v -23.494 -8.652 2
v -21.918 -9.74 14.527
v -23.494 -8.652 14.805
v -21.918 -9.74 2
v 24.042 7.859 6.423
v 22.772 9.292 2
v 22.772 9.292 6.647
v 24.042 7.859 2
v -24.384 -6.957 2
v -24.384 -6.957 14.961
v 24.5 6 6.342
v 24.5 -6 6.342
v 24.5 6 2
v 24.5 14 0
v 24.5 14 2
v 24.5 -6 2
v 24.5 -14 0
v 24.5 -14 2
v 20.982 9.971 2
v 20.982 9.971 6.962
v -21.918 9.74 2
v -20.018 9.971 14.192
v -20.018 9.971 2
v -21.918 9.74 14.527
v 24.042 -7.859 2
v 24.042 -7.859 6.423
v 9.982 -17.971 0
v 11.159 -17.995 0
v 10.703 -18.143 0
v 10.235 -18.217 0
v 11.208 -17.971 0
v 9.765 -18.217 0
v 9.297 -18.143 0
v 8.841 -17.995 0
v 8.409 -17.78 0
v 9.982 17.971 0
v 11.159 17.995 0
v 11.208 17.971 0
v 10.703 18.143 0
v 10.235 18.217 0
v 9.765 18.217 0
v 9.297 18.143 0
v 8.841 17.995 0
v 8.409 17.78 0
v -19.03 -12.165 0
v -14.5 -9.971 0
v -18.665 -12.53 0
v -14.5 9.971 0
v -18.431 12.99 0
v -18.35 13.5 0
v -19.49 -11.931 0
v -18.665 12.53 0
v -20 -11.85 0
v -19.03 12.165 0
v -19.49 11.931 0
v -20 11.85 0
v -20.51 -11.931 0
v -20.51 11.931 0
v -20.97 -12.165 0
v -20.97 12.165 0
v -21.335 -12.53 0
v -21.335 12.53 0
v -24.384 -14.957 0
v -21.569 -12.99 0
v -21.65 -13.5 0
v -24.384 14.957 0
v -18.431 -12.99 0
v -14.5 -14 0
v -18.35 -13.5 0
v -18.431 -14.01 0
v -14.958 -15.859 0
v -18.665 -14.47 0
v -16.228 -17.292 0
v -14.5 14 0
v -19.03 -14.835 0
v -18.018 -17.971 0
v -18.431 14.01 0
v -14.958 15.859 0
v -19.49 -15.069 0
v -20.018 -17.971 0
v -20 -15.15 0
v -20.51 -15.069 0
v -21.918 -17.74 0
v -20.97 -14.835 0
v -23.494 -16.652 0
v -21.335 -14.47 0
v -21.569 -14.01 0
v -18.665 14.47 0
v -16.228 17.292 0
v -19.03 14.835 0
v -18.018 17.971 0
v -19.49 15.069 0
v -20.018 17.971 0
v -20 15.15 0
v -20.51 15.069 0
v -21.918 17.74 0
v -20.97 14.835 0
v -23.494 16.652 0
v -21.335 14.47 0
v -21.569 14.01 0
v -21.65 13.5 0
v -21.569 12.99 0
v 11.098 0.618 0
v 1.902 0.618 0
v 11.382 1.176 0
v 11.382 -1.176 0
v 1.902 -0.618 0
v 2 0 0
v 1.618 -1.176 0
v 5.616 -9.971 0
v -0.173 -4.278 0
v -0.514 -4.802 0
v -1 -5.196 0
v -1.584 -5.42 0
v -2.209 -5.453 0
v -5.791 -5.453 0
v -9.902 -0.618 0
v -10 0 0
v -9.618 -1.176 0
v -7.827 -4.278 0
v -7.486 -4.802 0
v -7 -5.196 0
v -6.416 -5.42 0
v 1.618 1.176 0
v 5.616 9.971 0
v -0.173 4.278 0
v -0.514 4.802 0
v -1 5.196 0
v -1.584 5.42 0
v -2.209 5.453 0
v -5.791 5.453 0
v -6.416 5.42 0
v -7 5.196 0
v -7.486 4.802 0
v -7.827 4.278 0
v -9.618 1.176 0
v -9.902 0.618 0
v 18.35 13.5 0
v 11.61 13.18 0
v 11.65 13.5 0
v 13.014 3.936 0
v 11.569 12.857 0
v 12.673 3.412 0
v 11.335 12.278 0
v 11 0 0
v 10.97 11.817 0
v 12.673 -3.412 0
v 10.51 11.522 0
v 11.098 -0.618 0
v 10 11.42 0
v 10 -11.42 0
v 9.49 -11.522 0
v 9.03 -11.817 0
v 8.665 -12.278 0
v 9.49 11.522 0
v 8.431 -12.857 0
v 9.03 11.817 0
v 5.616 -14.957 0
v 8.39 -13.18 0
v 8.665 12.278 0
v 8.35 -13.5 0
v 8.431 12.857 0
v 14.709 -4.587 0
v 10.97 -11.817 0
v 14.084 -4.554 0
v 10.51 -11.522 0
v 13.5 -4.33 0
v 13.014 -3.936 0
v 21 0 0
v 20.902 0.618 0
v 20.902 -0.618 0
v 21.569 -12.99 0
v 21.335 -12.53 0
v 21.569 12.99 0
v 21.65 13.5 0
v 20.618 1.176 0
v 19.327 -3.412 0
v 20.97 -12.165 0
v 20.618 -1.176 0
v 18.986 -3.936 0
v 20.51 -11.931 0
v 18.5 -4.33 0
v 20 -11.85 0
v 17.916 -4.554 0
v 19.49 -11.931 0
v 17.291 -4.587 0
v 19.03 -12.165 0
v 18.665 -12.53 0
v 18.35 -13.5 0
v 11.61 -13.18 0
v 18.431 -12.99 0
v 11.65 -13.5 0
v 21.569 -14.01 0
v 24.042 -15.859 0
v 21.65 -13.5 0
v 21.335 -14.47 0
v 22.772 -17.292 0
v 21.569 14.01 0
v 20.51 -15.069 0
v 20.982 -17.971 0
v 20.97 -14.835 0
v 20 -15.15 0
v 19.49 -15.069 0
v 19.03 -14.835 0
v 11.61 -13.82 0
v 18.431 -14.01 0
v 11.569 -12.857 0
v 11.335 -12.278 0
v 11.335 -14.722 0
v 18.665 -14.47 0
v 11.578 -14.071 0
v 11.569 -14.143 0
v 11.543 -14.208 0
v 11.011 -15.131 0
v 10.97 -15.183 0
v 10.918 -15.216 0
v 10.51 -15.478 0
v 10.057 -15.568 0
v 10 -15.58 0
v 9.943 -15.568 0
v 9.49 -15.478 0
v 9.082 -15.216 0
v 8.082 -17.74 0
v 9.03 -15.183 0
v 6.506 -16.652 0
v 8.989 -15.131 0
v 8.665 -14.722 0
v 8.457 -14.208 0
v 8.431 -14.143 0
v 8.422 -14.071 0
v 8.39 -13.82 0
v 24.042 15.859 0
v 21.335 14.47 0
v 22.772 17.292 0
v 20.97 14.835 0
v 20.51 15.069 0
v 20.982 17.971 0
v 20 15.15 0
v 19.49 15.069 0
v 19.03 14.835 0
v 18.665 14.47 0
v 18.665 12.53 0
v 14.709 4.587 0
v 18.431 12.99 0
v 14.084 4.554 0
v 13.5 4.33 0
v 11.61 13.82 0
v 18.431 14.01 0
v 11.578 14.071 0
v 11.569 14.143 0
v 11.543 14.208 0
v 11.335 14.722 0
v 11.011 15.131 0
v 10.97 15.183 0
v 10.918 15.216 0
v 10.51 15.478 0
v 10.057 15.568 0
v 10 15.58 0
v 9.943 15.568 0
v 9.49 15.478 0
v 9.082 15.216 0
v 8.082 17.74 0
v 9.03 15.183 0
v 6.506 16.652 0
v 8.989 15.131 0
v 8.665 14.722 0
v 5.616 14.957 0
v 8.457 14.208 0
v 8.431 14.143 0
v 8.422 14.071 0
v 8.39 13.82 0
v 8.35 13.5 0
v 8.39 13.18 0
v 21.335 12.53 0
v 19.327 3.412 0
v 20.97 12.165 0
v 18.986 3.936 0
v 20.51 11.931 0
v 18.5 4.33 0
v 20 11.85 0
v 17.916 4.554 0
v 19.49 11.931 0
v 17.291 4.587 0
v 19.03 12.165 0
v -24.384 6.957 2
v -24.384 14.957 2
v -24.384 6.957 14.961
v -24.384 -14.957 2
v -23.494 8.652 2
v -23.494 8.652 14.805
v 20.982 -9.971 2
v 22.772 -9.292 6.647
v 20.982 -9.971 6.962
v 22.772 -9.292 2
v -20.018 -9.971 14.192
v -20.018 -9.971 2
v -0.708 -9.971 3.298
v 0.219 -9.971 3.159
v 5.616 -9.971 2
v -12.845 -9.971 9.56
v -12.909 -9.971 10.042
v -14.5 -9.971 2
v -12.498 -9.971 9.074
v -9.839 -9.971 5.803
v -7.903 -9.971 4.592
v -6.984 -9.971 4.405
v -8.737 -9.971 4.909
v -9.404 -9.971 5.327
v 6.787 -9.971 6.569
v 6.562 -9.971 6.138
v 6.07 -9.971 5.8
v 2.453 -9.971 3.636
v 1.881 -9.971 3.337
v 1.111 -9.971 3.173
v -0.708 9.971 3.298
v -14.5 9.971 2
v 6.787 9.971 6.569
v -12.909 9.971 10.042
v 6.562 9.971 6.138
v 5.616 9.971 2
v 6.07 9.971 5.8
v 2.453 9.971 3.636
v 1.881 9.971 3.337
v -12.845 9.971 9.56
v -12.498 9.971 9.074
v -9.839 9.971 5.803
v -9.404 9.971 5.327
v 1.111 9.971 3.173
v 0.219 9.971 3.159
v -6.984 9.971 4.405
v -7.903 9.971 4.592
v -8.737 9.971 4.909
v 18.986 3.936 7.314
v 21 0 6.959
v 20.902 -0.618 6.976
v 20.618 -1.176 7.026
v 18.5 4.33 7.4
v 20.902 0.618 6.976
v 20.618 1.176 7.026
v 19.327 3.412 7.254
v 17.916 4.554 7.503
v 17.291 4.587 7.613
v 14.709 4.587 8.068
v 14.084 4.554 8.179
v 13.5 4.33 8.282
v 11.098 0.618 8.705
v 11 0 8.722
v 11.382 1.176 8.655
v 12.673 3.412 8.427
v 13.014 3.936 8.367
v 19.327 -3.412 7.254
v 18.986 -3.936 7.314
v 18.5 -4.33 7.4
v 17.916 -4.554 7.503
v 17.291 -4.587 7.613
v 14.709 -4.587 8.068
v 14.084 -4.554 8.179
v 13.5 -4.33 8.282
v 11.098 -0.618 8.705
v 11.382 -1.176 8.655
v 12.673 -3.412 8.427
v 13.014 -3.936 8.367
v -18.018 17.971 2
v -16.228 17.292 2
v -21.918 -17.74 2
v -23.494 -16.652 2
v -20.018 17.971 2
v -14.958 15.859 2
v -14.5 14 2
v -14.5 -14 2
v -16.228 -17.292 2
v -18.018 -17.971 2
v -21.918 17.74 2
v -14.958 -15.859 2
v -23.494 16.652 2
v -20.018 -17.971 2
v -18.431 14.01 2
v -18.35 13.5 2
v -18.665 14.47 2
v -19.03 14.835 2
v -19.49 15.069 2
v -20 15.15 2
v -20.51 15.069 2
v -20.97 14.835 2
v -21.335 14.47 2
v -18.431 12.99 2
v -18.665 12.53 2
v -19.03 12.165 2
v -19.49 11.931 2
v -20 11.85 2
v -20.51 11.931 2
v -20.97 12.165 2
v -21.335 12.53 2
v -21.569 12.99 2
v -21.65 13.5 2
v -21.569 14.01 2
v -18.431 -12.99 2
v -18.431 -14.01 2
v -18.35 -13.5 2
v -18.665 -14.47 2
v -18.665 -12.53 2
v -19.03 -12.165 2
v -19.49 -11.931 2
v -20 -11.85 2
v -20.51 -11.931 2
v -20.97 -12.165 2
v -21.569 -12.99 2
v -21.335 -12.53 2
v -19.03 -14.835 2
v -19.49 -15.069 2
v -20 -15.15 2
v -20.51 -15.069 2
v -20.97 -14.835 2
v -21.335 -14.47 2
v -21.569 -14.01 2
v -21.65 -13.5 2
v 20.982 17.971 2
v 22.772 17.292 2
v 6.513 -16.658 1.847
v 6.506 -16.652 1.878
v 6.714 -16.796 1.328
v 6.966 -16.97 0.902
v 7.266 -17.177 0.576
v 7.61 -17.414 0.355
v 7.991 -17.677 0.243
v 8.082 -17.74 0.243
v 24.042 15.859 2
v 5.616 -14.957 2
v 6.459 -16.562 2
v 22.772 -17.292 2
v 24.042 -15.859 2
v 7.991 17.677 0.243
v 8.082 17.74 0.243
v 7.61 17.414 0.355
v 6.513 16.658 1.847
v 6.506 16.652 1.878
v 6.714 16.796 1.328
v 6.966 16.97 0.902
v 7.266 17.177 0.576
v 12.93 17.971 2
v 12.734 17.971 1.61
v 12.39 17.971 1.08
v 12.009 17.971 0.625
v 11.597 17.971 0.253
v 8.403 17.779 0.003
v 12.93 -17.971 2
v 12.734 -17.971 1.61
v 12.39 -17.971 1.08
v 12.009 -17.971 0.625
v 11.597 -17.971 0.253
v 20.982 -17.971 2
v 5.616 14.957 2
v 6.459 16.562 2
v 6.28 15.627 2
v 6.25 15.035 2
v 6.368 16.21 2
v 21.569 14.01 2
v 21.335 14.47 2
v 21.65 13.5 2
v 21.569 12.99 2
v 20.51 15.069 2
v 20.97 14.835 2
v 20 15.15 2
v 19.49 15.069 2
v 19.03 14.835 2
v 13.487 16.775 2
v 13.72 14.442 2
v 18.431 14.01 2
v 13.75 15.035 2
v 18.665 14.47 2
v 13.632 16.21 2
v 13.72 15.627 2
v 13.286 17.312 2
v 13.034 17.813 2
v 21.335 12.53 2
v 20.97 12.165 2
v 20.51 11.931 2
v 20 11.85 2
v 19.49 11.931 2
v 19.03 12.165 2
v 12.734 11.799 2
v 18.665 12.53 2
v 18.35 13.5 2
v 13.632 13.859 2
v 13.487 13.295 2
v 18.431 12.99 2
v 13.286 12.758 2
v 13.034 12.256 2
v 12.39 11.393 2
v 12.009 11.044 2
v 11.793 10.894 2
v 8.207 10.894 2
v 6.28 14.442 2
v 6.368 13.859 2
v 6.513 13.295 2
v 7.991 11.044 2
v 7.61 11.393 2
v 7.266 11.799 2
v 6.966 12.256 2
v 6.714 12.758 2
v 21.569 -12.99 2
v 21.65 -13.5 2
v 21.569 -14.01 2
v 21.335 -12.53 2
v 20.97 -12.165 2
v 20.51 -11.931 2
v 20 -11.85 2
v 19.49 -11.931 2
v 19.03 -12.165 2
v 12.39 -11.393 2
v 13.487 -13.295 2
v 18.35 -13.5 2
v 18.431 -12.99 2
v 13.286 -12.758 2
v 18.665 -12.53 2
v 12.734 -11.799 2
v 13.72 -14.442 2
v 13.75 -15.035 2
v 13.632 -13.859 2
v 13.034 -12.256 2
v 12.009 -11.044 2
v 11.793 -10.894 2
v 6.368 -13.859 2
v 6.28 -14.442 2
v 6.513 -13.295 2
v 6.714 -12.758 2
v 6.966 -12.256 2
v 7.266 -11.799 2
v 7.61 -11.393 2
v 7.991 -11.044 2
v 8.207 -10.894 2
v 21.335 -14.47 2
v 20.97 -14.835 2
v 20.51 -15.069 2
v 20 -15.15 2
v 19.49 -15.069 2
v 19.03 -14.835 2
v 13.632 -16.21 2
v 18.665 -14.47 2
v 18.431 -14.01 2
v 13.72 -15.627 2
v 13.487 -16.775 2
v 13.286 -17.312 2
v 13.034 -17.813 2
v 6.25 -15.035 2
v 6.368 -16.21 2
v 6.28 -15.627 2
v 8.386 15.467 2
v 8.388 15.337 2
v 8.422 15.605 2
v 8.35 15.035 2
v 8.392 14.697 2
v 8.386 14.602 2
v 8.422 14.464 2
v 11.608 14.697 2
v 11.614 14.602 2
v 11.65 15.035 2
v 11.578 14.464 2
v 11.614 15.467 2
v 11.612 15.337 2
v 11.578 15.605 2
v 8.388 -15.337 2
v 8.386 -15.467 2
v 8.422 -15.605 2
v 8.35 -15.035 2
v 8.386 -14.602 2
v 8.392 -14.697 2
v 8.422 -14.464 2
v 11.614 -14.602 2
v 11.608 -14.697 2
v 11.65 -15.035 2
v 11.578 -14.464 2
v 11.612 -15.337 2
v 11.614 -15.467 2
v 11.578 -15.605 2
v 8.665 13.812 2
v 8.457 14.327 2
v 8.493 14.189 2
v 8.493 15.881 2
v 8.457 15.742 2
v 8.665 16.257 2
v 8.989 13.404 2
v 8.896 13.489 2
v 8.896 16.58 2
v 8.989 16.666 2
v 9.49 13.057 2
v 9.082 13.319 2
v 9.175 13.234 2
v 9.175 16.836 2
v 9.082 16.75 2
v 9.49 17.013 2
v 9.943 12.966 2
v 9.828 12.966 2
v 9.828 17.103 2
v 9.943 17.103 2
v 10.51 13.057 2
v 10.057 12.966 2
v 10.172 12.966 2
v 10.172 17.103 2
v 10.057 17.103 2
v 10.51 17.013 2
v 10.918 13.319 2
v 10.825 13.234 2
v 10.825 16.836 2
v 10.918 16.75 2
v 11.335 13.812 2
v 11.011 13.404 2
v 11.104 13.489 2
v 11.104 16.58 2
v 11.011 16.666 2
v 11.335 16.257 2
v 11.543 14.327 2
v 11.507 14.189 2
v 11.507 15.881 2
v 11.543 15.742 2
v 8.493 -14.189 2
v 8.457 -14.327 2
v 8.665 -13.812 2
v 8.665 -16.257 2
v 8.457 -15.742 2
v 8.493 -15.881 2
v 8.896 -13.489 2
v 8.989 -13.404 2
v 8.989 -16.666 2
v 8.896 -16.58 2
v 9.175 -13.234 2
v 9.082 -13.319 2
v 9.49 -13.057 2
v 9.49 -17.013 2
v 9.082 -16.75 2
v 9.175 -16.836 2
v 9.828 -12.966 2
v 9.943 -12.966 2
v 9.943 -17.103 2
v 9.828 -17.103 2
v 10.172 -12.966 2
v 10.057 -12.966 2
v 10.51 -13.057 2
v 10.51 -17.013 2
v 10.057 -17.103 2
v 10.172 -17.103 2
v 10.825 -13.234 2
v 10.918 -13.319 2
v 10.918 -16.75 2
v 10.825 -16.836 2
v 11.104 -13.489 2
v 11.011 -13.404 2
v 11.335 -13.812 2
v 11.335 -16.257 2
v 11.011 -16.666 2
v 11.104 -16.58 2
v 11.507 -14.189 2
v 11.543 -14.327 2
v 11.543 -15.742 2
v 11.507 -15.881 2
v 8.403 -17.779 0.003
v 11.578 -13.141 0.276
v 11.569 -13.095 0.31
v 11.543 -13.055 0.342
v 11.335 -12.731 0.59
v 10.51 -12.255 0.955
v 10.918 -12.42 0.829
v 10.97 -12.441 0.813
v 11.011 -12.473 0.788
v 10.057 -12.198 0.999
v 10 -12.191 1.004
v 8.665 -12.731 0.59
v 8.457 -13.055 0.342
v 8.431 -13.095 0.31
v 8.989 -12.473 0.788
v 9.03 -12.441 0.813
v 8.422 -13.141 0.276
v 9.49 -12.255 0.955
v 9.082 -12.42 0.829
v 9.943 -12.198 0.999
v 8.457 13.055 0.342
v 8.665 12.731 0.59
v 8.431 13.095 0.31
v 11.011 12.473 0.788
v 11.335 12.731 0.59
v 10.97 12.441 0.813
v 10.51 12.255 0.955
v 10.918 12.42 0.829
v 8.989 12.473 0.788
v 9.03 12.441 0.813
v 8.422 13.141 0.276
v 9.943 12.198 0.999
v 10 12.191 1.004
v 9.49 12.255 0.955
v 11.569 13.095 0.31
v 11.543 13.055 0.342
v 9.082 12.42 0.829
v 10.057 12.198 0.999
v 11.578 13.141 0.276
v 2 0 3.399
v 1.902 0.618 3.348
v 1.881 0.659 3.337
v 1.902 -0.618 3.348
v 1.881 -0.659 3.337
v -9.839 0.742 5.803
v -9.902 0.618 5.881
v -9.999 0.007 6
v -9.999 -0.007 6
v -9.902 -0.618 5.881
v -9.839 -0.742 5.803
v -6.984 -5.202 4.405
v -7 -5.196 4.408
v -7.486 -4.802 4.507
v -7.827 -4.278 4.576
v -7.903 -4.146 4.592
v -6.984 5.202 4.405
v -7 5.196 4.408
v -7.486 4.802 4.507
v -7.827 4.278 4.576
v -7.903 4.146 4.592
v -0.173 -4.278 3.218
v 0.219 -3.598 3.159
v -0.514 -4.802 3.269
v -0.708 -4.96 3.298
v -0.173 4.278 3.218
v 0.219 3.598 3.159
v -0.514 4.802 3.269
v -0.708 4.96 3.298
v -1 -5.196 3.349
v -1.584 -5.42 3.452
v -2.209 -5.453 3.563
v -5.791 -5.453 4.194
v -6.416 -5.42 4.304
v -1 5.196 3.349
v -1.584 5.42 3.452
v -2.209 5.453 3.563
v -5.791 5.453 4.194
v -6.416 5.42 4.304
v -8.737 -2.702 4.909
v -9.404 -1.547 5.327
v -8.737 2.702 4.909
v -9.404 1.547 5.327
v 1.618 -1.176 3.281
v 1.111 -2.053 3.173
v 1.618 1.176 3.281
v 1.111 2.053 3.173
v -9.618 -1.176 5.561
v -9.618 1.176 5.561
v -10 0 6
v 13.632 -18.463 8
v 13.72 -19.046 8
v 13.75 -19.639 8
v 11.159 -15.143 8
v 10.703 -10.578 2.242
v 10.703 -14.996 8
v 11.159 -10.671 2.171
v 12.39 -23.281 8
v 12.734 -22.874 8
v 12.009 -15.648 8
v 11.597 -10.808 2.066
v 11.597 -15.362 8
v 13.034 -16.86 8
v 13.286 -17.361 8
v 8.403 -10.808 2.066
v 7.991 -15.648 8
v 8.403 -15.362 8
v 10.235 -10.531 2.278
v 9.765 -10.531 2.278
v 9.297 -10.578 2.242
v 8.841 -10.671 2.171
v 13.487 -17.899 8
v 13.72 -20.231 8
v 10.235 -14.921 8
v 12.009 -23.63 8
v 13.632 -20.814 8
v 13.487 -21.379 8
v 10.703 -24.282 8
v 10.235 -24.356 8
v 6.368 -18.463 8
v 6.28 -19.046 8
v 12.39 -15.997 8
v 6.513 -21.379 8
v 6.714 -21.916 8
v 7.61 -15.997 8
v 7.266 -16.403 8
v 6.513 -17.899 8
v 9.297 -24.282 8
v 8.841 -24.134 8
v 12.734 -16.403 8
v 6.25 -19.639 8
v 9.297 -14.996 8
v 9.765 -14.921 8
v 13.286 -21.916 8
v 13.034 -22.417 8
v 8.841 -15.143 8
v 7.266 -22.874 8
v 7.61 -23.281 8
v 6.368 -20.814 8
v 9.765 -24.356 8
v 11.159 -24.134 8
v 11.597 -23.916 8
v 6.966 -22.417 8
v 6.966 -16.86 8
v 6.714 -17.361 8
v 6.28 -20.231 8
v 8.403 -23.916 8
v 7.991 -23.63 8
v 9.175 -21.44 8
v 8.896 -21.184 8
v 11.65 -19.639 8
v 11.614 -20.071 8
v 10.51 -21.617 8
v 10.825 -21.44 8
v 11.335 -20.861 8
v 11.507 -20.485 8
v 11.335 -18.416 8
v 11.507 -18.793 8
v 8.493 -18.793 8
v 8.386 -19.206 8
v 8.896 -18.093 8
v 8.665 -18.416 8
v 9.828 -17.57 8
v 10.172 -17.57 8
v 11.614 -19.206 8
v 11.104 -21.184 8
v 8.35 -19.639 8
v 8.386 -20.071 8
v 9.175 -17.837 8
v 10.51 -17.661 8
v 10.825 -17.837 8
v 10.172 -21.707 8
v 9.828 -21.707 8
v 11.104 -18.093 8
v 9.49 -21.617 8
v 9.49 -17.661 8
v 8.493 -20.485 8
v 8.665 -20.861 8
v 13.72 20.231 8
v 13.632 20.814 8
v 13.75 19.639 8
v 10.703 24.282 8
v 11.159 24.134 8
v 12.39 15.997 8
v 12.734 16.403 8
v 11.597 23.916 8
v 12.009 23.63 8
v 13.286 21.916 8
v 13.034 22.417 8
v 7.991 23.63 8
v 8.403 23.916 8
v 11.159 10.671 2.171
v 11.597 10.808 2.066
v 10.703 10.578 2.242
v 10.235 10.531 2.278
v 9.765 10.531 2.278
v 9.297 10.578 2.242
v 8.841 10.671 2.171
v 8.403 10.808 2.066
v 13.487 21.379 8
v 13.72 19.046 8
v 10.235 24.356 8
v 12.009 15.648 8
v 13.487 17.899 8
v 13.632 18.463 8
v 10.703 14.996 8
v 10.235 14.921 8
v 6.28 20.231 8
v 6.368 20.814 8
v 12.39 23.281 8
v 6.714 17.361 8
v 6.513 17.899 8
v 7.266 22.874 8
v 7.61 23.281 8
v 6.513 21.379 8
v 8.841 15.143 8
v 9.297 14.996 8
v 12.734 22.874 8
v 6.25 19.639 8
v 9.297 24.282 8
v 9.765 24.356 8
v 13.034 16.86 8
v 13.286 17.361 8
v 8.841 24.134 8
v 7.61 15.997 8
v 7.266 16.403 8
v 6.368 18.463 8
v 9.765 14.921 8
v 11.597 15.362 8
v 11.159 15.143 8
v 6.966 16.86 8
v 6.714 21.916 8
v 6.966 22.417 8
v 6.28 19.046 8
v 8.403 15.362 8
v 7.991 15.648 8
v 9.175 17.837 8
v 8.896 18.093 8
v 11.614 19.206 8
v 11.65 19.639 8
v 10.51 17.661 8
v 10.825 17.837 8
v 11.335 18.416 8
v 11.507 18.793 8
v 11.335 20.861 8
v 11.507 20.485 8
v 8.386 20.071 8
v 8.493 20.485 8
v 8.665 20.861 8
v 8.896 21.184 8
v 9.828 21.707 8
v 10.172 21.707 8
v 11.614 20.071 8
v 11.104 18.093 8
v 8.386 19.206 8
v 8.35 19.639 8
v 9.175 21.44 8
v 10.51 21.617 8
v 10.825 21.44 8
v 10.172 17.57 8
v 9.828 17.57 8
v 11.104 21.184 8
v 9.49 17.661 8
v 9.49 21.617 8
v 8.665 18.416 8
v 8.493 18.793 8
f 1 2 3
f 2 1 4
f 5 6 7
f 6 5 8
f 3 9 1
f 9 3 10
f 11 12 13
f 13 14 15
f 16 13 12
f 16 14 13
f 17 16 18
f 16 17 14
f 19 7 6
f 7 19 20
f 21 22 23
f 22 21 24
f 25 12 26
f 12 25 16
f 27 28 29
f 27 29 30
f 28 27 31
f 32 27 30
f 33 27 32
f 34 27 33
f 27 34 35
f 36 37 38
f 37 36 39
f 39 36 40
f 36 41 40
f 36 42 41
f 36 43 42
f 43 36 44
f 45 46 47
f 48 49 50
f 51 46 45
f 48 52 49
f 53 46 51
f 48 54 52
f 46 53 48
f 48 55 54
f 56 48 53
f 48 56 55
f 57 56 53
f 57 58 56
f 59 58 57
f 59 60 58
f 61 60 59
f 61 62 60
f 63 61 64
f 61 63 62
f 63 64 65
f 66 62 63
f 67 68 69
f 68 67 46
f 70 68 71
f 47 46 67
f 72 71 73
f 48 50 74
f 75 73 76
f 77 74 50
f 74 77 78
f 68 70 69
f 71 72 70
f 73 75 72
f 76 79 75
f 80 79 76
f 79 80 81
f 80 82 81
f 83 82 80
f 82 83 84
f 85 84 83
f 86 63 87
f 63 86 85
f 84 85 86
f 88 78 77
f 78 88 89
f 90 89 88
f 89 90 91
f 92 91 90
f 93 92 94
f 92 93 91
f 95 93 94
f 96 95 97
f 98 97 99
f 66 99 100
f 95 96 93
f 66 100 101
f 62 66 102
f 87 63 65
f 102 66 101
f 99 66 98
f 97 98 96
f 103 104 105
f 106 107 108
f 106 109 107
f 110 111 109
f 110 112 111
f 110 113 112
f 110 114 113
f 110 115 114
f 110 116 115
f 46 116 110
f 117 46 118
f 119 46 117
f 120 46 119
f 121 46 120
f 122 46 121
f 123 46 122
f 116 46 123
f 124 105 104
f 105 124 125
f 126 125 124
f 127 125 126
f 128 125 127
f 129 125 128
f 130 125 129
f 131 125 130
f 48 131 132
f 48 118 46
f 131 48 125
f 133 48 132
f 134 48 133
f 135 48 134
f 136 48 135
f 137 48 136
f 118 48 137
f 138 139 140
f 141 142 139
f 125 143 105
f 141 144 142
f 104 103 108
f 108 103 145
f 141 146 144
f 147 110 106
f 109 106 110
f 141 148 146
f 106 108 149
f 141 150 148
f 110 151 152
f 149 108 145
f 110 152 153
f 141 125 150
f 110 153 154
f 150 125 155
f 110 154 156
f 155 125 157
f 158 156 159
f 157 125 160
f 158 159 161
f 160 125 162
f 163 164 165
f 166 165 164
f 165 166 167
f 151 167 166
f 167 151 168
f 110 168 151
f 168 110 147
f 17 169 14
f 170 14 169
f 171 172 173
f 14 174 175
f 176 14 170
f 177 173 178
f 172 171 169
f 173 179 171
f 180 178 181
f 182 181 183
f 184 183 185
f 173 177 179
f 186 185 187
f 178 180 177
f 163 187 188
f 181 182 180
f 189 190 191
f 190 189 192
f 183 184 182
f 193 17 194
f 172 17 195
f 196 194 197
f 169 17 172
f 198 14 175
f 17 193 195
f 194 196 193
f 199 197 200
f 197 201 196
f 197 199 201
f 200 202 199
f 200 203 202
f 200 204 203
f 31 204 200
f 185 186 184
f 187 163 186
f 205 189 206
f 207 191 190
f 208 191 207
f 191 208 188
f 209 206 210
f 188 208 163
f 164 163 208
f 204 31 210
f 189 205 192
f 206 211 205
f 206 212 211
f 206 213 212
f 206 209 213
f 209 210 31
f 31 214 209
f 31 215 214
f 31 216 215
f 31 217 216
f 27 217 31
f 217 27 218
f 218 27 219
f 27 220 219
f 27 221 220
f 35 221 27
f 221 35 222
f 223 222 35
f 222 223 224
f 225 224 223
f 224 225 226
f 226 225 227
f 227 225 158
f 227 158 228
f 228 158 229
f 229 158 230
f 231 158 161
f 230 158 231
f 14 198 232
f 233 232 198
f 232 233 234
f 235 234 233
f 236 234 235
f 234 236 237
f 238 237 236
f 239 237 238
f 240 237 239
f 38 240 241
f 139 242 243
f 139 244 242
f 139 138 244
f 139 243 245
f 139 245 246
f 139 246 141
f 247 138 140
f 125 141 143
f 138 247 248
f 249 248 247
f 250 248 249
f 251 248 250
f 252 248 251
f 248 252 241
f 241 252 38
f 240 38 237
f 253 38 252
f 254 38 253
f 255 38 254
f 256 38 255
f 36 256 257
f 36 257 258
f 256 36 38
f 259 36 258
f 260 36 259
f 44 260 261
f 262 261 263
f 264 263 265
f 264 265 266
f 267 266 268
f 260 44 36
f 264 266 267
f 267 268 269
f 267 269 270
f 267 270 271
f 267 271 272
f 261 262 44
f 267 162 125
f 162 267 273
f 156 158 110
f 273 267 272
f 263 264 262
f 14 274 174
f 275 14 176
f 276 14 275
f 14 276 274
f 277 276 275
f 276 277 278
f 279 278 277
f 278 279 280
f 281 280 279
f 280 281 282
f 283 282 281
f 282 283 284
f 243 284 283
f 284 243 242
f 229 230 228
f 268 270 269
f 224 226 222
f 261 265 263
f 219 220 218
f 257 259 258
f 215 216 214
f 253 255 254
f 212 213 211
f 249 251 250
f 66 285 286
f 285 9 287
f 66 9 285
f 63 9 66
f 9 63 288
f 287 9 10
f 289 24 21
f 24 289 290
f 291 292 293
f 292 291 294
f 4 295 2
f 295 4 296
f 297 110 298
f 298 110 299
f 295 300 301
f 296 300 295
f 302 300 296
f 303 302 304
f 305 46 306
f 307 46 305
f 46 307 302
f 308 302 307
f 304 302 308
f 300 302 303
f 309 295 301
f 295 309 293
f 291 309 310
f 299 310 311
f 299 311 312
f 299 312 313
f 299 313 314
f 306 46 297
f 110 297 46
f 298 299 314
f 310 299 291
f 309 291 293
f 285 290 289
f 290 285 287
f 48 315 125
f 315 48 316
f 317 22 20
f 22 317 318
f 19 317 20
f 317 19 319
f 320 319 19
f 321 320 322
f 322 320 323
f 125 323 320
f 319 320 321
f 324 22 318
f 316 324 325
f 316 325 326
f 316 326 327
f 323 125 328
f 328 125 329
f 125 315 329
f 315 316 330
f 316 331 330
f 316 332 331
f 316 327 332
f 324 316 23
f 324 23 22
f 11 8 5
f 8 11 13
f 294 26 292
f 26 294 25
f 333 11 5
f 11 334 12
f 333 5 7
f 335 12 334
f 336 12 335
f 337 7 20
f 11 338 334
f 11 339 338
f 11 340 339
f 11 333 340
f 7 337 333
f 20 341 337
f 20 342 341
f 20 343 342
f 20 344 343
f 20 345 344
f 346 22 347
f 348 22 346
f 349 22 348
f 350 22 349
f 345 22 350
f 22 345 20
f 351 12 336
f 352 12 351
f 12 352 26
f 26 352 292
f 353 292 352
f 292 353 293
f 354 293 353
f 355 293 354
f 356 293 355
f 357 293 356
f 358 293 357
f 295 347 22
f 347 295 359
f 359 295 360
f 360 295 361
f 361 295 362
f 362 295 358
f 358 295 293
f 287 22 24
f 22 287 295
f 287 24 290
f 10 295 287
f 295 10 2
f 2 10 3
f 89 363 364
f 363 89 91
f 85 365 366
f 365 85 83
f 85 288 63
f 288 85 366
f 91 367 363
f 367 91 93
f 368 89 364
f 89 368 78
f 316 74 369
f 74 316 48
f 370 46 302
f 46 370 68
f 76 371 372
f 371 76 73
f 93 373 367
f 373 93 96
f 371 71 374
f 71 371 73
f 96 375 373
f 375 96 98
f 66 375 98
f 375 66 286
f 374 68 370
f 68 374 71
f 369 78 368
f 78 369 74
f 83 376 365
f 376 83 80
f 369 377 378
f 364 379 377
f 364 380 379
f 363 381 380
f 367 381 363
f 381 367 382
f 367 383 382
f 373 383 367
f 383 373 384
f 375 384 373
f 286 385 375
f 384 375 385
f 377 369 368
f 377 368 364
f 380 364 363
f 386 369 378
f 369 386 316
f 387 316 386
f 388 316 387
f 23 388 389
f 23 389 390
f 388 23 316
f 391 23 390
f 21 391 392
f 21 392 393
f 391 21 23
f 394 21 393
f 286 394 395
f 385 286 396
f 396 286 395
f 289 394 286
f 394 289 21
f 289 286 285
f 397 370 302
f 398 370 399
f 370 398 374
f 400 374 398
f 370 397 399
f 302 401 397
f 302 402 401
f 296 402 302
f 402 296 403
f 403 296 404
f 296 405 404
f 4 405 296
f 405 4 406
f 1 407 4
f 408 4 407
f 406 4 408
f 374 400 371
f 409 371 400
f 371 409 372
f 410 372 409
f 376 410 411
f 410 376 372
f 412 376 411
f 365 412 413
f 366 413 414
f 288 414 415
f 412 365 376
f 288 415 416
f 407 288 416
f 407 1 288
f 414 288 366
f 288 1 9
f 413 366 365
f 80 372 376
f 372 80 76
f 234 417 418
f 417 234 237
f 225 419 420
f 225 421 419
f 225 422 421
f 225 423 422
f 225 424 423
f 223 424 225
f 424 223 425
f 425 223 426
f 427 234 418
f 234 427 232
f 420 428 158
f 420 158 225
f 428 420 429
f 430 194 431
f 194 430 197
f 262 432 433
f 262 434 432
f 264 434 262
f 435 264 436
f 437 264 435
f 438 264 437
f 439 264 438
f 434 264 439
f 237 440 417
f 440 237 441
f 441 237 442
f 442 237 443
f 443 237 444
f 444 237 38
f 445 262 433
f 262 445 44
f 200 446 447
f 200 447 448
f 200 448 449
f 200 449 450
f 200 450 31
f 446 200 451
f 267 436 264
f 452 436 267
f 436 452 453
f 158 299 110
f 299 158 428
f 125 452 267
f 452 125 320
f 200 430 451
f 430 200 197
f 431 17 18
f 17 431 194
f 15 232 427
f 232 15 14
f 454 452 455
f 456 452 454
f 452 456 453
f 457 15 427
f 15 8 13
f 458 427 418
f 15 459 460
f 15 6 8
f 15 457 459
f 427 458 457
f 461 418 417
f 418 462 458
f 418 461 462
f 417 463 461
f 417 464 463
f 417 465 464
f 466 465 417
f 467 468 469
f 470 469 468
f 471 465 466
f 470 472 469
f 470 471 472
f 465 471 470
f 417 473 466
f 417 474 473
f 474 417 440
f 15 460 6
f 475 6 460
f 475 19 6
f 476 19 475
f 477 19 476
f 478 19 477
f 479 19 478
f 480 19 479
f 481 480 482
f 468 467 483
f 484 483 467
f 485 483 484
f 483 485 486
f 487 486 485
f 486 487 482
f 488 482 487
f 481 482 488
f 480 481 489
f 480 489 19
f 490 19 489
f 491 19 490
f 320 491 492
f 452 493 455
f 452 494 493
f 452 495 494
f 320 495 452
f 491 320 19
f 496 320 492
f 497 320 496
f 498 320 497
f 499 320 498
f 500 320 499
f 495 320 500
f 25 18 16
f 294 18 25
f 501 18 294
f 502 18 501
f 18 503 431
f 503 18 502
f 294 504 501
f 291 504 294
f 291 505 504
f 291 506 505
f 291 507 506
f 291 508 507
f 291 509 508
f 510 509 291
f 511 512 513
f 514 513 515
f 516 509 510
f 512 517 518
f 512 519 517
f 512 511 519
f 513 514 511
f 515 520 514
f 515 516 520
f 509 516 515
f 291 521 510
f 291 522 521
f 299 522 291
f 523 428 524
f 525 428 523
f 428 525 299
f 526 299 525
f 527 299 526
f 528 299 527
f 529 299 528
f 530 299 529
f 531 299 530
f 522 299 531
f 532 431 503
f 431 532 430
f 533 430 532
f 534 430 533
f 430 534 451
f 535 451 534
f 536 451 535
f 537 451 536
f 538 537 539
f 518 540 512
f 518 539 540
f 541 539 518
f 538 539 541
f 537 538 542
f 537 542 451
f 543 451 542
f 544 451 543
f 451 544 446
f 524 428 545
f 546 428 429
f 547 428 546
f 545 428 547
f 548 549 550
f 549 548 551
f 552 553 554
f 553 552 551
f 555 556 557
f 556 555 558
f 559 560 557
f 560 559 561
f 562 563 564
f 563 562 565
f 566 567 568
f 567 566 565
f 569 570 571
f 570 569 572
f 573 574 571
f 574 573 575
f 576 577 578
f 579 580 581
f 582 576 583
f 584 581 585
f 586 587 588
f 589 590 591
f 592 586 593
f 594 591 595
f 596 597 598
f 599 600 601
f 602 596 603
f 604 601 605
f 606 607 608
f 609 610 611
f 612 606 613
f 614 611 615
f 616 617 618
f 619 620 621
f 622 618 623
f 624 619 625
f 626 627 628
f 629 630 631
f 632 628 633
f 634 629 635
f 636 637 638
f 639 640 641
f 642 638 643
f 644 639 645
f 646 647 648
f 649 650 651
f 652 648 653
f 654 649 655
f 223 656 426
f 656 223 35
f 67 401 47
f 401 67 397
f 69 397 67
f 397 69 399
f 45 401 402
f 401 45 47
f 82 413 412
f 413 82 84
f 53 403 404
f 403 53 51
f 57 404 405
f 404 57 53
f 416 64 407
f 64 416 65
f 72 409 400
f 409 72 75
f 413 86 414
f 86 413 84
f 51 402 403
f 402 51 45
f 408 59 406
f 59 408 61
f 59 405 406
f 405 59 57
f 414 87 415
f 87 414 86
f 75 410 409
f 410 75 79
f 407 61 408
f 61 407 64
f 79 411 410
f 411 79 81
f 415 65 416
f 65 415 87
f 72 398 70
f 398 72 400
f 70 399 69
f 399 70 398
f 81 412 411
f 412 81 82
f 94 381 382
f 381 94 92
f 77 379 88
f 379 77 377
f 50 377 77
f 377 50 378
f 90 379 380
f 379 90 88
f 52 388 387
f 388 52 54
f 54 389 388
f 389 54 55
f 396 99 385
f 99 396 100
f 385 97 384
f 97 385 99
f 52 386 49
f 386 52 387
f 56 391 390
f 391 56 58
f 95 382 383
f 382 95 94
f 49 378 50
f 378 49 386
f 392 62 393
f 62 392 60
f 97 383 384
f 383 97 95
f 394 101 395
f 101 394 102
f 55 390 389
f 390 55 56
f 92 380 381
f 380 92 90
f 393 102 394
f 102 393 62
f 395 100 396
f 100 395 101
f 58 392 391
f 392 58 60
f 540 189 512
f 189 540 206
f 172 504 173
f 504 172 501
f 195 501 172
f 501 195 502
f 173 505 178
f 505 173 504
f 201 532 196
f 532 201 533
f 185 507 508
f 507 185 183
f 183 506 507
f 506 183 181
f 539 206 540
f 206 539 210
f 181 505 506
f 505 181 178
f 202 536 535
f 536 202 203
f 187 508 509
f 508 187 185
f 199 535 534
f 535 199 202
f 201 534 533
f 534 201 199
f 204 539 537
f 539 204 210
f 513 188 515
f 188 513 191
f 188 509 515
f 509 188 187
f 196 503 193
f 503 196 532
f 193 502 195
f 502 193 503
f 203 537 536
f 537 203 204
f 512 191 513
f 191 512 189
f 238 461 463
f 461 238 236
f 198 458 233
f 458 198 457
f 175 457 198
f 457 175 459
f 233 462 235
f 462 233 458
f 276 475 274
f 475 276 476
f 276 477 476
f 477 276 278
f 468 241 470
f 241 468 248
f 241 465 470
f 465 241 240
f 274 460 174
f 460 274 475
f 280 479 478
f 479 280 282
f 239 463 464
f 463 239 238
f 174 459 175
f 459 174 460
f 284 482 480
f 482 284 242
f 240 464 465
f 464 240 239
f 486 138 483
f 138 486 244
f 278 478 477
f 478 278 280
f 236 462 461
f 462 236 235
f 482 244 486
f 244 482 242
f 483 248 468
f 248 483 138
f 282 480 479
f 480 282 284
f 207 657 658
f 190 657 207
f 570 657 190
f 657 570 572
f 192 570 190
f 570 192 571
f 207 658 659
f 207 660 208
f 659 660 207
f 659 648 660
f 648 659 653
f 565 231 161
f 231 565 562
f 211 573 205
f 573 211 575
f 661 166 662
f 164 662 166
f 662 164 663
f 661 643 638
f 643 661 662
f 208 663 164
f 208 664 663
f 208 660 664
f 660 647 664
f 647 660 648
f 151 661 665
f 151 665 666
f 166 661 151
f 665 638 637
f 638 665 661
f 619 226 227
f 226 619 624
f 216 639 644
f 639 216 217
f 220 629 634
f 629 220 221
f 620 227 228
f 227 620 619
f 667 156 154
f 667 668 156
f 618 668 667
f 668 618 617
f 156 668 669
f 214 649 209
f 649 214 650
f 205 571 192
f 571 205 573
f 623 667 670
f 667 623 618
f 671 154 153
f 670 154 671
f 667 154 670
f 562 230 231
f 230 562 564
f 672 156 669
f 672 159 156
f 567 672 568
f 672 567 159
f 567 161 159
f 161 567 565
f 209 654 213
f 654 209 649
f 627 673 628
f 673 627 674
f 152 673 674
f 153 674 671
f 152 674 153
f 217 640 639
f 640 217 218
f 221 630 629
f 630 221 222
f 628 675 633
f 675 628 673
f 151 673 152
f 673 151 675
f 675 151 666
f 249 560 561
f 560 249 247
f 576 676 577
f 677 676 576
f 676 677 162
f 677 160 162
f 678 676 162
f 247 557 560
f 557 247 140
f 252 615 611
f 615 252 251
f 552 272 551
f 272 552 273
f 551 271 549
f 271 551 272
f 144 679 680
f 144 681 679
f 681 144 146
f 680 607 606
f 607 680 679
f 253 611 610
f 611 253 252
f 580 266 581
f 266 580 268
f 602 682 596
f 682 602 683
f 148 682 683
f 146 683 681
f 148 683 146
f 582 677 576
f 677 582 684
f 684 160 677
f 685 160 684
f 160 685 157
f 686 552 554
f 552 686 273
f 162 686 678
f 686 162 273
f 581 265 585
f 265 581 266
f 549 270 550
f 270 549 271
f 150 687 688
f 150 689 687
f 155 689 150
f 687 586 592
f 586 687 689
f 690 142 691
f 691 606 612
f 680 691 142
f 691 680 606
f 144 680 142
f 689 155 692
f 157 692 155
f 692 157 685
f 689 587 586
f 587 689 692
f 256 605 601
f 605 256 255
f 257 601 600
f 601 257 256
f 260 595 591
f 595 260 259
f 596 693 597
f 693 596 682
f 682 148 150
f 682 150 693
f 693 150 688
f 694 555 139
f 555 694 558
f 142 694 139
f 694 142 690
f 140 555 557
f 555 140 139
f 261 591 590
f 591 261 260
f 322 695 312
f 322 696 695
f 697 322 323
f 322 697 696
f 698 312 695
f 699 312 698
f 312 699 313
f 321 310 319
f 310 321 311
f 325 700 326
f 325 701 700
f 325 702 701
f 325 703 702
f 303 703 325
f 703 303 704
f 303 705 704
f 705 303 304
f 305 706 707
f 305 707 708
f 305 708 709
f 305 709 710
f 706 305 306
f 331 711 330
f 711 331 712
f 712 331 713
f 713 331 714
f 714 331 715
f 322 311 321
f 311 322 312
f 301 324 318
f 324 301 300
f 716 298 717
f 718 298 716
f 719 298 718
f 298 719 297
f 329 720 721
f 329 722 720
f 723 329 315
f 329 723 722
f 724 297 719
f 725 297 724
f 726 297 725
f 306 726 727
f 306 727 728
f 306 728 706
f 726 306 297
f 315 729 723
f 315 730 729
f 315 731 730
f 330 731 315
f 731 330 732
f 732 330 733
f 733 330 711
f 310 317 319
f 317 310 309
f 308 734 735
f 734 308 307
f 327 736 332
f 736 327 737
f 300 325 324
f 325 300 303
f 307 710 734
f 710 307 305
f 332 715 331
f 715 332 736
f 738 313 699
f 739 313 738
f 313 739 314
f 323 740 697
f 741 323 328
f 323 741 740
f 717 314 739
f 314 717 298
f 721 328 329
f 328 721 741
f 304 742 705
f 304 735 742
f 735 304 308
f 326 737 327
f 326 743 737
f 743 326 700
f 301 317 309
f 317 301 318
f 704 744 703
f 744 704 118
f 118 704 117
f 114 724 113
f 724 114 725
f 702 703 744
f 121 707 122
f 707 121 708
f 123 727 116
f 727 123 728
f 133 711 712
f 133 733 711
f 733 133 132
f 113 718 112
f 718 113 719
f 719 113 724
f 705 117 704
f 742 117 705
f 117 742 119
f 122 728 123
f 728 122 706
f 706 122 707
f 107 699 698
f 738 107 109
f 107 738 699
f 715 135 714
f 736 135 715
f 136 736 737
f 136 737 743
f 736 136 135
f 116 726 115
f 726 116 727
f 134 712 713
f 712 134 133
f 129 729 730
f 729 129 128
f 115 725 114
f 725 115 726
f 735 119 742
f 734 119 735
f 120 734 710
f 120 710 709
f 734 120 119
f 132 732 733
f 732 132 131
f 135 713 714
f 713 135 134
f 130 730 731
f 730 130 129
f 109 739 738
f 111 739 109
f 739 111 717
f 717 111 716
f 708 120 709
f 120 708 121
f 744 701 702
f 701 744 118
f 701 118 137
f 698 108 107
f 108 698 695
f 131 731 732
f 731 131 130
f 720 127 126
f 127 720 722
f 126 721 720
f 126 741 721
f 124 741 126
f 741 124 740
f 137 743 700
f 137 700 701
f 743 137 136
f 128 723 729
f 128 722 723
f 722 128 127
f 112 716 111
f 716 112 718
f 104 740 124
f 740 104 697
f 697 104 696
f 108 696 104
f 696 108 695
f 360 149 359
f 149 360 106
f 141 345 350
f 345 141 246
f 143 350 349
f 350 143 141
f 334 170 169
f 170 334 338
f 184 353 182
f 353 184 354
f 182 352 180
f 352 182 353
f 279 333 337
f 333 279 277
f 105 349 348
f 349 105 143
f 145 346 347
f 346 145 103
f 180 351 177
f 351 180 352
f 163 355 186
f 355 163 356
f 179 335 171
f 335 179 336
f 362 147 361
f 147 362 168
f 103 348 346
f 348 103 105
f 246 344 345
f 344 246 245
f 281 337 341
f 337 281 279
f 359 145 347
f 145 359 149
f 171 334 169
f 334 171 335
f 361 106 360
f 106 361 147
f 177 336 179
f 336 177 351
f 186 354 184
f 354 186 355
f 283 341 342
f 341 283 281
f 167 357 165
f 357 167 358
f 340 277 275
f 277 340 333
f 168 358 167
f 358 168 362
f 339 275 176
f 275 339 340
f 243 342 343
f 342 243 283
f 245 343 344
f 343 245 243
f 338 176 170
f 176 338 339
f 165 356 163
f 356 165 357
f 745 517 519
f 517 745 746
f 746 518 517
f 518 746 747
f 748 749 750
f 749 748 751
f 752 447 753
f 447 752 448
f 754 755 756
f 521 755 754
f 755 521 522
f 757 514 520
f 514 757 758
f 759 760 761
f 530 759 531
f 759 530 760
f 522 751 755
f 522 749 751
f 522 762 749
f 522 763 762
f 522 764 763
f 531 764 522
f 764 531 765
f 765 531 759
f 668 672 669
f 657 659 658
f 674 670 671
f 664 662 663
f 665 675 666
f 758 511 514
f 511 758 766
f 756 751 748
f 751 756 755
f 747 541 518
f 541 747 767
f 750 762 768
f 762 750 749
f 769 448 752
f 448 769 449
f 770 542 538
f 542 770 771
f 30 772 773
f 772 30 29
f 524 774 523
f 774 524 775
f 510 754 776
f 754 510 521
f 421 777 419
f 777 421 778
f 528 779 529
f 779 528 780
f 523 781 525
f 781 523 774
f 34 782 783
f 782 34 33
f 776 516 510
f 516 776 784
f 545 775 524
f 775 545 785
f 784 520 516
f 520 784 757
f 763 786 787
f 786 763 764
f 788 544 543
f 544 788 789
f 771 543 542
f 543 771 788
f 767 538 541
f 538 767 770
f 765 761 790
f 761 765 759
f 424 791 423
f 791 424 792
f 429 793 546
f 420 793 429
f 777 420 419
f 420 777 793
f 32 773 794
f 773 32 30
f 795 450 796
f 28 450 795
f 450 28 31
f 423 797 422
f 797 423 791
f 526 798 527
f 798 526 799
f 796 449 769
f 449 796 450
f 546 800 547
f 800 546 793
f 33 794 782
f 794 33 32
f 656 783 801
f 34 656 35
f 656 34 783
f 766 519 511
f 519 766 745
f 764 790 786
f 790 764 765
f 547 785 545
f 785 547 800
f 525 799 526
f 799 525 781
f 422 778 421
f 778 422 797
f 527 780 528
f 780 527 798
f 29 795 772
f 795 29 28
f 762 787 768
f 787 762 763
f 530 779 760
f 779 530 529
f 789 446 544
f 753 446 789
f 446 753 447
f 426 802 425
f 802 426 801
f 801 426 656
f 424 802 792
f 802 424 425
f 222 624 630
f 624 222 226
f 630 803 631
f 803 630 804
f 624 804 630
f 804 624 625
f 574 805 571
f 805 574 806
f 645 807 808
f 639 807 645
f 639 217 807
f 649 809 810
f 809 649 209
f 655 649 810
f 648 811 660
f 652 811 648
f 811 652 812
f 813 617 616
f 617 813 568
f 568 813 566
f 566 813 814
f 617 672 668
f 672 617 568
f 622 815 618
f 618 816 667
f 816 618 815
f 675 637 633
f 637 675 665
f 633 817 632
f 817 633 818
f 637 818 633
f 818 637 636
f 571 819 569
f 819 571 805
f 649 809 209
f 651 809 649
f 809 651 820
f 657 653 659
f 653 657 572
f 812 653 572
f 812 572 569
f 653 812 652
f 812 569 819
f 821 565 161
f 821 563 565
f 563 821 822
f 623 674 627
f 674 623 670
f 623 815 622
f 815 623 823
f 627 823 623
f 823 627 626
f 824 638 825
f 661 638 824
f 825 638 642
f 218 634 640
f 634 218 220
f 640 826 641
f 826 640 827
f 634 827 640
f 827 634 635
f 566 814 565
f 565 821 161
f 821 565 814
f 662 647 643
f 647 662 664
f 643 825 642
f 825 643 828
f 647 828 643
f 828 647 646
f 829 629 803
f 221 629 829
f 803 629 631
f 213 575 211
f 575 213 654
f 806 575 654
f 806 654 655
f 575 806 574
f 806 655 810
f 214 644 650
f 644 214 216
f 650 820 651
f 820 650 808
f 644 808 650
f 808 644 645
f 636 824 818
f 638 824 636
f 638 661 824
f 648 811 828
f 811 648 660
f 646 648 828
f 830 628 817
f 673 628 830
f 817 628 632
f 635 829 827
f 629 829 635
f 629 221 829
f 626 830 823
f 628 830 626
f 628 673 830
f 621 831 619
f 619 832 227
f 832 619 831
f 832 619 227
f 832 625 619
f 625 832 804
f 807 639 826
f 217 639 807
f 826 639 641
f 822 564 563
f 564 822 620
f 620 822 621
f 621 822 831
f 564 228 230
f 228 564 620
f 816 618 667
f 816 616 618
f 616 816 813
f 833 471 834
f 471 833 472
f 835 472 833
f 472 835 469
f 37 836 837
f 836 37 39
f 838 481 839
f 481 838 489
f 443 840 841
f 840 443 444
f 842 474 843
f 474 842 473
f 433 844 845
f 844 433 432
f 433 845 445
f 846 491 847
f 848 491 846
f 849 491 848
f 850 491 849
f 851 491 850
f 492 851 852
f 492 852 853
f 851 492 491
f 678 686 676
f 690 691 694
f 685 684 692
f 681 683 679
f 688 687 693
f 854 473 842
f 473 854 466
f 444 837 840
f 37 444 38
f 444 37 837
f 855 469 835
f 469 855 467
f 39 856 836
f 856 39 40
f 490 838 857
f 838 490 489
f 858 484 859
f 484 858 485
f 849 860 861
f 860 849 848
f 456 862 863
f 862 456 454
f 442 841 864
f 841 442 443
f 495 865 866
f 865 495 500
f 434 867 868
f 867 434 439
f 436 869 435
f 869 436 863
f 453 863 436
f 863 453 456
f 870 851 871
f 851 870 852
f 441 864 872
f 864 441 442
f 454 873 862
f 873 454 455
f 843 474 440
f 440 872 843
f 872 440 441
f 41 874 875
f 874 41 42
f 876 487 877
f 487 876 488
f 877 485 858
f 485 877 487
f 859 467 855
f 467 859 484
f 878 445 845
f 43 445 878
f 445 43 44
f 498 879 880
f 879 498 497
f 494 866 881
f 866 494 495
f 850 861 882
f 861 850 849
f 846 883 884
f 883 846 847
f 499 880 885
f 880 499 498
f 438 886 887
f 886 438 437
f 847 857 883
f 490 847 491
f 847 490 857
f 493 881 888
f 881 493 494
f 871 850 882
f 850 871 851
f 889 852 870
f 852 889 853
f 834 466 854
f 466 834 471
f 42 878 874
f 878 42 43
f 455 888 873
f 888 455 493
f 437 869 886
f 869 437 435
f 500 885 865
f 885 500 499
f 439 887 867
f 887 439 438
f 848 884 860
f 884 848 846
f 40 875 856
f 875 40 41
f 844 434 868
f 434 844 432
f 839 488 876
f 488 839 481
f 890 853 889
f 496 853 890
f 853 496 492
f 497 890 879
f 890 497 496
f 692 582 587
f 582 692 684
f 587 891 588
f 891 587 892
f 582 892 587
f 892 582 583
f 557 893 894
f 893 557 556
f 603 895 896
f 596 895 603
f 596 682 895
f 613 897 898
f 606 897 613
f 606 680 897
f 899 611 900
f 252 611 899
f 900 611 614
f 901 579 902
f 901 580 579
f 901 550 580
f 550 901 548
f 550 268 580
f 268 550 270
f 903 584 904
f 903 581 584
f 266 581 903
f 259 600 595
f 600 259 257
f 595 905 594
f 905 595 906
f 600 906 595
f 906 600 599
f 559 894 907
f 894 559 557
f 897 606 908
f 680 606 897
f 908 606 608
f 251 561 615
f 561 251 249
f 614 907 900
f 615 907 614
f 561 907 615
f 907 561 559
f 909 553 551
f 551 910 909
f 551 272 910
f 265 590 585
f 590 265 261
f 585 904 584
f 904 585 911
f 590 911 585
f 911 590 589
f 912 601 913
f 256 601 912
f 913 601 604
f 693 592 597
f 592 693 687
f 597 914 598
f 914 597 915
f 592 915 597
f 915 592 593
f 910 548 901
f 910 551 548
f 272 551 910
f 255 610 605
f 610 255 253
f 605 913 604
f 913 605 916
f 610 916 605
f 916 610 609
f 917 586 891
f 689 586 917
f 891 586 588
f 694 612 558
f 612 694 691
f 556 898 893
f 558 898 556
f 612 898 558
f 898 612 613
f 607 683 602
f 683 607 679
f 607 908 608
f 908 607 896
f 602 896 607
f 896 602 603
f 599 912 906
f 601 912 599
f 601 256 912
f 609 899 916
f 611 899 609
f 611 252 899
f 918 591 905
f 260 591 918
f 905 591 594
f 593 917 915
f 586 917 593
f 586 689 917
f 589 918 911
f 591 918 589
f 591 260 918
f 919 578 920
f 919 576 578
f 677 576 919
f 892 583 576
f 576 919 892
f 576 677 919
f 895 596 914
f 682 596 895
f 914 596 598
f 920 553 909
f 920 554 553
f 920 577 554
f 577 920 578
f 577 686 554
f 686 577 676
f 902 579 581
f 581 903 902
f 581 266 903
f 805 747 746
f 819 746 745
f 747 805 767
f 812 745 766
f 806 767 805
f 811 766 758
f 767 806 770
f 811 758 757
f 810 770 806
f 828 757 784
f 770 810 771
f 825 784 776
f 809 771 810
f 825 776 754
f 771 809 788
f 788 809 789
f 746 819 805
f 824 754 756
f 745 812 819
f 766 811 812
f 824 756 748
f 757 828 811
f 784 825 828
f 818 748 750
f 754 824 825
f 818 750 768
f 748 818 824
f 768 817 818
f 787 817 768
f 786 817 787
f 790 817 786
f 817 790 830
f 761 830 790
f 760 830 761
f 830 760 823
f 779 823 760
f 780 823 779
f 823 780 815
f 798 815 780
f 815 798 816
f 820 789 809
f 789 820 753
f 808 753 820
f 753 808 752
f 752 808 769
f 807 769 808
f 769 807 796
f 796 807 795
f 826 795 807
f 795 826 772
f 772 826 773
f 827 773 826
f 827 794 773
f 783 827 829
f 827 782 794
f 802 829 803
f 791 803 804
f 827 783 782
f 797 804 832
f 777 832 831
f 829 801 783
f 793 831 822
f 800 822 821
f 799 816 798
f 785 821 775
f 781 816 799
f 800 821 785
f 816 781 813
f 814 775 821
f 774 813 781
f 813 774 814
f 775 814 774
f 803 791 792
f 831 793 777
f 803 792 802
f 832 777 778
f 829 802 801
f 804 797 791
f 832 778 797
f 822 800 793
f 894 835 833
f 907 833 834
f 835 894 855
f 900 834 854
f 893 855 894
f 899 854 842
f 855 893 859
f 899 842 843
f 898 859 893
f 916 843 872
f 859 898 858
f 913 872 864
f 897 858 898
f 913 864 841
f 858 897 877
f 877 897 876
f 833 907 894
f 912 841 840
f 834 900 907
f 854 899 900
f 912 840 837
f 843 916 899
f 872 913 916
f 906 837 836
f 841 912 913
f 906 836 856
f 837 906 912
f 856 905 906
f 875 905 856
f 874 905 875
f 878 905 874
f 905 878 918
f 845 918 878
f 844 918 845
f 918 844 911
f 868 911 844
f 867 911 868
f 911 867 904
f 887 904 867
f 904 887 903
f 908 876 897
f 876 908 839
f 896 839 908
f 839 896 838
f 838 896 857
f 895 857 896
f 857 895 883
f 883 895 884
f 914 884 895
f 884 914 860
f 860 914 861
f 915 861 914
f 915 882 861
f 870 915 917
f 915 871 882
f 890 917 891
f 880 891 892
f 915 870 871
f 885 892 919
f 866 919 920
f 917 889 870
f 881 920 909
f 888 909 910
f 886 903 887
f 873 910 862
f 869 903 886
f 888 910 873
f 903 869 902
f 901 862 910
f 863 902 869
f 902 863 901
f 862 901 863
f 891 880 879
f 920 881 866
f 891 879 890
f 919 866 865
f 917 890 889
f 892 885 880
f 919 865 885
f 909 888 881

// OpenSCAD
// file: honeycomb_lattice.scad
/**
 * Honeycomb lattice library
 *
 * @autor: vpoten
 */
 
/**
 *
 */
module hexagon(rad, cornerR, thick) {
hull(){
	for(i=[0:5]){
	rotate([0,0,60*i]) translate([rad,0,0]) cylinder(r=cornerR, h=thick, $fn=20);
	}
}
}//end module hexagon

/**
 * @param rows:  number of rowns, must be greater than 0
 * @param cols:  number of colummns, must be greater than 1
 */
module honeycombLattice(rows, cols, hexaR, cornerR, thick, innerDst, fillHalves=false) {

extHexR = sqrt(2*cornerR*cornerR) + hexaR + innerDst/2;
extHexSideL = sin(30)*extHexR*2;
extHexH = cos(30)*extHexR;
dist = 2*extHexR + extHexSideL;
hexH = sqrt(2*cornerR*cornerR) + hexaR;

numEvenCols = floor(cols/2)+(cols%2);
numOddCols = floor(cols/2);

translate([extHexR,extHexH,0]) {
for(i=[0:rows-1]){
	if((i%2)==1){
		for(j=[0:numOddCols-1]) translate([dist*j+(extHexR+extHexSideL/2),i*extHexH,0]) hexagon(hexaR, cornerR, thick);
	}
	else{
		for(j=[0:numEvenCols-1]) translate([dist*j,i*extHexH,0]) hexagon(hexaR, cornerR, thick);
	}
}

if( fillHalves==true ){

	for(i=[-1,rows]){ 
		for(j=[0:numOddCols-1]) translate([dist*j+(extHexR+extHexSideL/2),i*extHexH,0]){
			difference(){
			hexagon(hexaR, cornerR, thick);
			if(i==-1){ translate([0,-extHexR/2+innerDst/2,0]) cube(size=[extHexR*2,extHexR,thick*2.5],center=true); }
			else{ translate([0,extHexR/2-innerDst/2,0]) cube(size=[extHexR*2,extHexR,thick*2.5],center=true); }
			}
		}
	}
}

}//translate

}//end module honeycombLattice

//test
hexagon(20, 2, 29);
honeycombLattice(2, 4, 15, 3, 3, 11, fillHalves=false);
color("grey") translate([0,0,40]) honeycombLattice(5, 6, 11, 2, 3, 19, fillHalves=true);
color("blue") translate([0,0,60]) honeycombLattice(3, 5, 5, 2, bottomThick+1, 3, fillHalves=true);
// file: dronePlates.scad
/**
 * dronePlates.scad
 * Plate library
 *
 * GNU GPL V3
 * @author: Victor Potenciano
 */

m3Rad = 3.4/2;
cornerR = 4;

/**
 *
 */
module helperDisk(diameter) {
	cylinder(r = diameter/2, h = 0.6, $fn=20);
}

/**
 *
 */
module roundedRect(size, radius) {
	x = size[0];
	y = size[1];
	z = size[2];

	linear_extrude(height=z)
	hull() {
	// place 4 circles in the corners, with the given radius
	translate([(-x/2)+(radius/2), (-y/2)+(radius/2), 0]){ circle(r=radius); }
	translate([(x/2)-(radius/2), (-y/2)+(radius/2), 0]){ circle(r=radius); }
	translate([(-x/2)+(radius/2), (y/2)-(radius/2), 0]){ circle(r=radius); }
	translate([(x/2)-(radius/2), (y/2)-(radius/2), 0]){ circle(r=radius); }
	}
}

/**
 * rounded rectangle triangle with corner at origin
 */
module roundedTriangle(size, radius) {
	x = size[0];
	y = size[1];
	z = size[2];

	linear_extrude(height=z)
	hull() {
	translate([radius, radius, 0]){ circle(r=radius); }
	translate([x-radius, radius, 0]){ circle(r=radius); }
	translate([radius, y-radius, 0]){ circle(r=radius); }
	}
}

/**
 *
 */
module roundRectPlate(w, l, plateThick=3) {
	difference(){
		roundedRect([l+m3Rad*1.75,w+m3Rad*1.75,plateThick], cornerR);
		translate([l/2, w/2, -0.5]) { cylinder(h = plateThick+1, r = m3Rad, $fn=30); }
		translate([-l/2, w/2, -0.5]) { cylinder(h = plateThick+1, r = m3Rad, $fn=30); }
		translate([l/2, -w/2, -0.5]) { cylinder(h = plateThick+1, r = m3Rad, $fn=30); }
		translate([-l/2, -w/2, -0.5]) { cylinder(h = plateThick+1, r = m3Rad, $fn=30); }
	}
}

/**
 *
 */
module crossSquarePlate(l, thick=3) {
	inDist = cornerR*2+4;
	trianL = sqrt((l*l)/2)-inDist;
	centerR = 4;

	difference(){
		roundRectPlate(l, l, thick);
		translate([0, centerR, -0.5]) { 
			rotate([0,0,45]){ roundedTriangle([trianL,trianL,thick+1], cornerR-2); }
		}
		translate([0, -centerR, -0.5]) { 
			rotate([0,0,225]){ roundedTriangle([trianL,trianL,thick+1], cornerR-2); }
		}
		translate([-centerR, 0, -0.5]) { 
			rotate([0,0,135]){ roundedTriangle([trianL,trianL,thick+1], cornerR-2); }
		}
		translate([centerR, 0, -0.5]) { 
			rotate([0,0,-45]){ roundedTriangle([trianL,trianL,thick+1], cornerR-2); }
		}
	}
}

/**
 *
 */
module hShapePlate(w, l, thick=4) {
	inDist = cornerR*2+1;

	difference(){
		roundRectPlate(w, l, thick);
		translate([0, w/4, -0.5]) { roundedRect([l-inDist,w/2-inDist,thick+1], cornerR-2); }
		translate([0, -w/4, -0.5]) { roundedRect([l-inDist,w/2-inDist,thick+1], cornerR-2); }
	}
}

/**
 *
 */
module motorCircleMount(inDia, outDia, thick=3, extraH=false, d1=19, d2=16, holeR=m3Rad ) {
	difference(){
		cylinder(h = thick, r = outDia/2, $fn=30);
		motorCircleMountHoles(inDia, outDia, thick, extraH, d1=d1, d2=d2, holeR=holeR);
	}
}

/**
 *
 */
module motorCircleMountHoles(inDia, outDia, thick=3, extraH=false, d1=19, d2=16, d3=25, holeR=m3Rad) {
	translate([0, 0, -0.5]) { cylinder(h = thick+1, r = inDia/2, $fn=30); }

	for(i=[0:3]) {
		rotate([0,0,90*i]){
		translate([d1/2, 0, -0.5]) cylinder(h = thick+1, r = holeR, $fn=20);
		translate([d2/2, 0, -0.5]) cylinder(h = thick+1, r = holeR, $fn=20);
		translate([d2/2, -holeR, -0.5]) cube(size = [(d1-d2)/2,holeR*2,thick+1]);
		}
	}
	
	if(extraH==true){	
		for(i=[-1,1]) translate([i*d3/2, 0, -0.5]) { cylinder(h = thick+1, r = holeR, $fn=30); }
	}
}

/**
 *
 */
module motorRectMount(w, l, inDia, thick=3) {
	d1=19;
	d2=16;

	difference(){
		roundRectPlate(w, l, thick);
		translate([0, 0, -0.5]) { cylinder(h = thick+1, r = inDia/2, $fn=30); }
		translate([0, d1/2, -0.5]) { cylinder(h = thick+1, r = m3Rad, $fn=30); }
		translate([0, -d1/2, -0.5]) { cylinder(h = thick+1, r = m3Rad, $fn=30); }
		translate([d2/2, 0, -0.5]) { cylinder(h = thick+1, r = m3Rad, $fn=30); }
		translate([-d2/2, 0, -0.5]) { cylinder(h = thick+1, r = m3Rad, $fn=30); }
	}
}

/**
 *
 */
module tube(inDia, outDia, height) {
	difference(){
		cylinder(h = height, r = outDia/2, $fn=50);
		translate([0, 0, -0.5]) { cylinder(h = height+1, r = inDia/2, $fn=30); }
	}
}

/**
 *
 */
module squareTube(inDia, outDia, height) {
	translate([0,0,height/2]){
	difference(){
		cube(size = [outDia,outDia,height], center = true);
		cube(size = [inDia,inDia,height+1], center = true);
	}
	}
}

/**
 *
 */
module djiFlamewheelHoles(height) {
	a = 23;
	b = 16;
	c = 19.5;
	
	translate([a/2, c/2, 0]) { cylinder(h = height, r = m3Rad, $fn=30); }
	translate([-a/2, c/2, 0]) { cylinder(h = height, r = m3Rad, $fn=30); }
	translate([b/2, -c/2, 0]) { cylinder(h = height, r = m3Rad, $fn=30); }
	translate([-b/2, -c/2, 0]) { cylinder(h = height, r = m3Rad, $fn=30); }
}

/**
 *
 */
module djiFlamewheelHolesBotton(height) {
	a1 = 21;
	c = 19.5;
	
	translate([a1/2, c/2, 0]) { cylinder(h = height, r = m3Rad, $fn=30); }
	translate([-a1/2, c/2, 0]) { cylinder(h = height, r = m3Rad, $fn=30); }
}

/**
 *
 */
module propeller(size){
union(){
difference(){
	cylinder(h = 3, r = size/2, center=true, $fn=30);
	cylinder(h = 3.1, r = size/2-2, center=true, $fn=30); 
}
for( i = [-1,1] ){
rotate([0,0,45*i]){ cube(size = [size,4,1], center = true); }
}
}
}

/**
 *
 */
module slot(length, height, rad){
for(i=[-1,1]) translate([i*length/2,0,0]) cylinder(h = height, r = rad, $fn=30);
translate([0,0,height/2]) cube(size = [length,rad*2,height], center = true);
}

 

////////////////////////
// Examples:
////////////////////////

motorCircleMount(8, 25, 3.5);

//roundedRect([50,50,3], 4);

//hShapePlate(79, 25);

//rotate([0,0,45]){roundedTriangle([40,40,3], 4);}

//crossSquarePlate(45, 4);

/*
union(){
motorRectMount(21, 18, 8, 4);
translate([9, 10.5, 0]) {tube(m3Rad*2, 6.5, 6);}
}
*/

/*
difference(){
union(){
hShapePlate(50, 30, 3.5);
translate([-4,-25,0]){cube(size = [8,50,3.5]);}
rotate([0, 0, 45]) {motorCircleMount(8, 35, 3.5);}
}
cylinder(h = 10, r = 4, $fn=100, center=true);
}
*/

//rotate([90,0,0]){ tube(5,10,20); }
//translate([20,0,0]){ squareTube(5, 10, 20); }
// main file
/** 
 * tweaker mobius simple mount v2
 */

use <dronePlates.scad>;
use <honeycomb_lattice.scad>;

m3Rad = 3.3/2;
angle=10;
length=45;
width=32;
thick=2;
angle2=75;
font1="DejaVu Sans Mono";


///translate([45,0,0]) cube(size=[5,5,12]); //probe

difference(){

union(){
translate([-(length/2-3),0,0]) roundedRect([6,32,thick], 4);
translate([(length/2-7.5),0,0]) roundedRect([15,32,thick], 4);

intersection(){
roundedRect([length,16,30], 4);
rotate([0,angle,0]) translate([0,0,-25+10.5]) cube(size=[100,50,50], center=true);
}
}//union

//holes
for(i=[-1,1]) for(j=[-1,1]) {
translate([i*40/2,j*27/2,0]) cylinder(r=m3Rad, h=90, $fn=20, center=true);
}

for(i=[-1,1]){
translate([40/2-10,i*27/2,0]) rotate([-i*angle2/2,0,0]) cylinder(r=m3Rad, h=90, $fn=20,center=true);
}

//transversal half hexagon
translate([-7,0,9/*10*/])
rotate([90,angle,0]) {
difference(){
translate([4,0,-30]) scale([1,0.5/*0.6*/,1]) hexagon(7,3,60);
translate([-50/2,0,-35])cube(size=[50,20,70]);
}
}//end transversal


translate([-4,0,0]) hexagon(4,2,6);
translate([16,0,0]) hexagon(3,2,12);

//height cut
translate([0,0,25+18.5]) cube(size=[100,50,50], center=true);

//text
translate([-18,-2.5,17.5]) rotate([0,angle,0]) linear_extrude(height=0.3) text("Tweaker",size=5, font=font1);
}//diff

//antenna holder
difference(){

for(i=[-1,1]){
translate([40/2-10,i*27/2,0]) rotate([-i*angle2/2,0,0]) tube(m3Rad*2, 7.5, 13);
}

translate([0,0,-10/2]) cube(size=[100,100,10], center=true);
for(i=[-1,1]){
translate([40/2-10,i*27/2,10/2+8]) cube(size=[10,25,10], center=true);
}

}//diff

///translate([0,50,0]) rotate([0,angle,0]) linear_extrude(height=1) text("Tweaker",size=6, font=font1);
